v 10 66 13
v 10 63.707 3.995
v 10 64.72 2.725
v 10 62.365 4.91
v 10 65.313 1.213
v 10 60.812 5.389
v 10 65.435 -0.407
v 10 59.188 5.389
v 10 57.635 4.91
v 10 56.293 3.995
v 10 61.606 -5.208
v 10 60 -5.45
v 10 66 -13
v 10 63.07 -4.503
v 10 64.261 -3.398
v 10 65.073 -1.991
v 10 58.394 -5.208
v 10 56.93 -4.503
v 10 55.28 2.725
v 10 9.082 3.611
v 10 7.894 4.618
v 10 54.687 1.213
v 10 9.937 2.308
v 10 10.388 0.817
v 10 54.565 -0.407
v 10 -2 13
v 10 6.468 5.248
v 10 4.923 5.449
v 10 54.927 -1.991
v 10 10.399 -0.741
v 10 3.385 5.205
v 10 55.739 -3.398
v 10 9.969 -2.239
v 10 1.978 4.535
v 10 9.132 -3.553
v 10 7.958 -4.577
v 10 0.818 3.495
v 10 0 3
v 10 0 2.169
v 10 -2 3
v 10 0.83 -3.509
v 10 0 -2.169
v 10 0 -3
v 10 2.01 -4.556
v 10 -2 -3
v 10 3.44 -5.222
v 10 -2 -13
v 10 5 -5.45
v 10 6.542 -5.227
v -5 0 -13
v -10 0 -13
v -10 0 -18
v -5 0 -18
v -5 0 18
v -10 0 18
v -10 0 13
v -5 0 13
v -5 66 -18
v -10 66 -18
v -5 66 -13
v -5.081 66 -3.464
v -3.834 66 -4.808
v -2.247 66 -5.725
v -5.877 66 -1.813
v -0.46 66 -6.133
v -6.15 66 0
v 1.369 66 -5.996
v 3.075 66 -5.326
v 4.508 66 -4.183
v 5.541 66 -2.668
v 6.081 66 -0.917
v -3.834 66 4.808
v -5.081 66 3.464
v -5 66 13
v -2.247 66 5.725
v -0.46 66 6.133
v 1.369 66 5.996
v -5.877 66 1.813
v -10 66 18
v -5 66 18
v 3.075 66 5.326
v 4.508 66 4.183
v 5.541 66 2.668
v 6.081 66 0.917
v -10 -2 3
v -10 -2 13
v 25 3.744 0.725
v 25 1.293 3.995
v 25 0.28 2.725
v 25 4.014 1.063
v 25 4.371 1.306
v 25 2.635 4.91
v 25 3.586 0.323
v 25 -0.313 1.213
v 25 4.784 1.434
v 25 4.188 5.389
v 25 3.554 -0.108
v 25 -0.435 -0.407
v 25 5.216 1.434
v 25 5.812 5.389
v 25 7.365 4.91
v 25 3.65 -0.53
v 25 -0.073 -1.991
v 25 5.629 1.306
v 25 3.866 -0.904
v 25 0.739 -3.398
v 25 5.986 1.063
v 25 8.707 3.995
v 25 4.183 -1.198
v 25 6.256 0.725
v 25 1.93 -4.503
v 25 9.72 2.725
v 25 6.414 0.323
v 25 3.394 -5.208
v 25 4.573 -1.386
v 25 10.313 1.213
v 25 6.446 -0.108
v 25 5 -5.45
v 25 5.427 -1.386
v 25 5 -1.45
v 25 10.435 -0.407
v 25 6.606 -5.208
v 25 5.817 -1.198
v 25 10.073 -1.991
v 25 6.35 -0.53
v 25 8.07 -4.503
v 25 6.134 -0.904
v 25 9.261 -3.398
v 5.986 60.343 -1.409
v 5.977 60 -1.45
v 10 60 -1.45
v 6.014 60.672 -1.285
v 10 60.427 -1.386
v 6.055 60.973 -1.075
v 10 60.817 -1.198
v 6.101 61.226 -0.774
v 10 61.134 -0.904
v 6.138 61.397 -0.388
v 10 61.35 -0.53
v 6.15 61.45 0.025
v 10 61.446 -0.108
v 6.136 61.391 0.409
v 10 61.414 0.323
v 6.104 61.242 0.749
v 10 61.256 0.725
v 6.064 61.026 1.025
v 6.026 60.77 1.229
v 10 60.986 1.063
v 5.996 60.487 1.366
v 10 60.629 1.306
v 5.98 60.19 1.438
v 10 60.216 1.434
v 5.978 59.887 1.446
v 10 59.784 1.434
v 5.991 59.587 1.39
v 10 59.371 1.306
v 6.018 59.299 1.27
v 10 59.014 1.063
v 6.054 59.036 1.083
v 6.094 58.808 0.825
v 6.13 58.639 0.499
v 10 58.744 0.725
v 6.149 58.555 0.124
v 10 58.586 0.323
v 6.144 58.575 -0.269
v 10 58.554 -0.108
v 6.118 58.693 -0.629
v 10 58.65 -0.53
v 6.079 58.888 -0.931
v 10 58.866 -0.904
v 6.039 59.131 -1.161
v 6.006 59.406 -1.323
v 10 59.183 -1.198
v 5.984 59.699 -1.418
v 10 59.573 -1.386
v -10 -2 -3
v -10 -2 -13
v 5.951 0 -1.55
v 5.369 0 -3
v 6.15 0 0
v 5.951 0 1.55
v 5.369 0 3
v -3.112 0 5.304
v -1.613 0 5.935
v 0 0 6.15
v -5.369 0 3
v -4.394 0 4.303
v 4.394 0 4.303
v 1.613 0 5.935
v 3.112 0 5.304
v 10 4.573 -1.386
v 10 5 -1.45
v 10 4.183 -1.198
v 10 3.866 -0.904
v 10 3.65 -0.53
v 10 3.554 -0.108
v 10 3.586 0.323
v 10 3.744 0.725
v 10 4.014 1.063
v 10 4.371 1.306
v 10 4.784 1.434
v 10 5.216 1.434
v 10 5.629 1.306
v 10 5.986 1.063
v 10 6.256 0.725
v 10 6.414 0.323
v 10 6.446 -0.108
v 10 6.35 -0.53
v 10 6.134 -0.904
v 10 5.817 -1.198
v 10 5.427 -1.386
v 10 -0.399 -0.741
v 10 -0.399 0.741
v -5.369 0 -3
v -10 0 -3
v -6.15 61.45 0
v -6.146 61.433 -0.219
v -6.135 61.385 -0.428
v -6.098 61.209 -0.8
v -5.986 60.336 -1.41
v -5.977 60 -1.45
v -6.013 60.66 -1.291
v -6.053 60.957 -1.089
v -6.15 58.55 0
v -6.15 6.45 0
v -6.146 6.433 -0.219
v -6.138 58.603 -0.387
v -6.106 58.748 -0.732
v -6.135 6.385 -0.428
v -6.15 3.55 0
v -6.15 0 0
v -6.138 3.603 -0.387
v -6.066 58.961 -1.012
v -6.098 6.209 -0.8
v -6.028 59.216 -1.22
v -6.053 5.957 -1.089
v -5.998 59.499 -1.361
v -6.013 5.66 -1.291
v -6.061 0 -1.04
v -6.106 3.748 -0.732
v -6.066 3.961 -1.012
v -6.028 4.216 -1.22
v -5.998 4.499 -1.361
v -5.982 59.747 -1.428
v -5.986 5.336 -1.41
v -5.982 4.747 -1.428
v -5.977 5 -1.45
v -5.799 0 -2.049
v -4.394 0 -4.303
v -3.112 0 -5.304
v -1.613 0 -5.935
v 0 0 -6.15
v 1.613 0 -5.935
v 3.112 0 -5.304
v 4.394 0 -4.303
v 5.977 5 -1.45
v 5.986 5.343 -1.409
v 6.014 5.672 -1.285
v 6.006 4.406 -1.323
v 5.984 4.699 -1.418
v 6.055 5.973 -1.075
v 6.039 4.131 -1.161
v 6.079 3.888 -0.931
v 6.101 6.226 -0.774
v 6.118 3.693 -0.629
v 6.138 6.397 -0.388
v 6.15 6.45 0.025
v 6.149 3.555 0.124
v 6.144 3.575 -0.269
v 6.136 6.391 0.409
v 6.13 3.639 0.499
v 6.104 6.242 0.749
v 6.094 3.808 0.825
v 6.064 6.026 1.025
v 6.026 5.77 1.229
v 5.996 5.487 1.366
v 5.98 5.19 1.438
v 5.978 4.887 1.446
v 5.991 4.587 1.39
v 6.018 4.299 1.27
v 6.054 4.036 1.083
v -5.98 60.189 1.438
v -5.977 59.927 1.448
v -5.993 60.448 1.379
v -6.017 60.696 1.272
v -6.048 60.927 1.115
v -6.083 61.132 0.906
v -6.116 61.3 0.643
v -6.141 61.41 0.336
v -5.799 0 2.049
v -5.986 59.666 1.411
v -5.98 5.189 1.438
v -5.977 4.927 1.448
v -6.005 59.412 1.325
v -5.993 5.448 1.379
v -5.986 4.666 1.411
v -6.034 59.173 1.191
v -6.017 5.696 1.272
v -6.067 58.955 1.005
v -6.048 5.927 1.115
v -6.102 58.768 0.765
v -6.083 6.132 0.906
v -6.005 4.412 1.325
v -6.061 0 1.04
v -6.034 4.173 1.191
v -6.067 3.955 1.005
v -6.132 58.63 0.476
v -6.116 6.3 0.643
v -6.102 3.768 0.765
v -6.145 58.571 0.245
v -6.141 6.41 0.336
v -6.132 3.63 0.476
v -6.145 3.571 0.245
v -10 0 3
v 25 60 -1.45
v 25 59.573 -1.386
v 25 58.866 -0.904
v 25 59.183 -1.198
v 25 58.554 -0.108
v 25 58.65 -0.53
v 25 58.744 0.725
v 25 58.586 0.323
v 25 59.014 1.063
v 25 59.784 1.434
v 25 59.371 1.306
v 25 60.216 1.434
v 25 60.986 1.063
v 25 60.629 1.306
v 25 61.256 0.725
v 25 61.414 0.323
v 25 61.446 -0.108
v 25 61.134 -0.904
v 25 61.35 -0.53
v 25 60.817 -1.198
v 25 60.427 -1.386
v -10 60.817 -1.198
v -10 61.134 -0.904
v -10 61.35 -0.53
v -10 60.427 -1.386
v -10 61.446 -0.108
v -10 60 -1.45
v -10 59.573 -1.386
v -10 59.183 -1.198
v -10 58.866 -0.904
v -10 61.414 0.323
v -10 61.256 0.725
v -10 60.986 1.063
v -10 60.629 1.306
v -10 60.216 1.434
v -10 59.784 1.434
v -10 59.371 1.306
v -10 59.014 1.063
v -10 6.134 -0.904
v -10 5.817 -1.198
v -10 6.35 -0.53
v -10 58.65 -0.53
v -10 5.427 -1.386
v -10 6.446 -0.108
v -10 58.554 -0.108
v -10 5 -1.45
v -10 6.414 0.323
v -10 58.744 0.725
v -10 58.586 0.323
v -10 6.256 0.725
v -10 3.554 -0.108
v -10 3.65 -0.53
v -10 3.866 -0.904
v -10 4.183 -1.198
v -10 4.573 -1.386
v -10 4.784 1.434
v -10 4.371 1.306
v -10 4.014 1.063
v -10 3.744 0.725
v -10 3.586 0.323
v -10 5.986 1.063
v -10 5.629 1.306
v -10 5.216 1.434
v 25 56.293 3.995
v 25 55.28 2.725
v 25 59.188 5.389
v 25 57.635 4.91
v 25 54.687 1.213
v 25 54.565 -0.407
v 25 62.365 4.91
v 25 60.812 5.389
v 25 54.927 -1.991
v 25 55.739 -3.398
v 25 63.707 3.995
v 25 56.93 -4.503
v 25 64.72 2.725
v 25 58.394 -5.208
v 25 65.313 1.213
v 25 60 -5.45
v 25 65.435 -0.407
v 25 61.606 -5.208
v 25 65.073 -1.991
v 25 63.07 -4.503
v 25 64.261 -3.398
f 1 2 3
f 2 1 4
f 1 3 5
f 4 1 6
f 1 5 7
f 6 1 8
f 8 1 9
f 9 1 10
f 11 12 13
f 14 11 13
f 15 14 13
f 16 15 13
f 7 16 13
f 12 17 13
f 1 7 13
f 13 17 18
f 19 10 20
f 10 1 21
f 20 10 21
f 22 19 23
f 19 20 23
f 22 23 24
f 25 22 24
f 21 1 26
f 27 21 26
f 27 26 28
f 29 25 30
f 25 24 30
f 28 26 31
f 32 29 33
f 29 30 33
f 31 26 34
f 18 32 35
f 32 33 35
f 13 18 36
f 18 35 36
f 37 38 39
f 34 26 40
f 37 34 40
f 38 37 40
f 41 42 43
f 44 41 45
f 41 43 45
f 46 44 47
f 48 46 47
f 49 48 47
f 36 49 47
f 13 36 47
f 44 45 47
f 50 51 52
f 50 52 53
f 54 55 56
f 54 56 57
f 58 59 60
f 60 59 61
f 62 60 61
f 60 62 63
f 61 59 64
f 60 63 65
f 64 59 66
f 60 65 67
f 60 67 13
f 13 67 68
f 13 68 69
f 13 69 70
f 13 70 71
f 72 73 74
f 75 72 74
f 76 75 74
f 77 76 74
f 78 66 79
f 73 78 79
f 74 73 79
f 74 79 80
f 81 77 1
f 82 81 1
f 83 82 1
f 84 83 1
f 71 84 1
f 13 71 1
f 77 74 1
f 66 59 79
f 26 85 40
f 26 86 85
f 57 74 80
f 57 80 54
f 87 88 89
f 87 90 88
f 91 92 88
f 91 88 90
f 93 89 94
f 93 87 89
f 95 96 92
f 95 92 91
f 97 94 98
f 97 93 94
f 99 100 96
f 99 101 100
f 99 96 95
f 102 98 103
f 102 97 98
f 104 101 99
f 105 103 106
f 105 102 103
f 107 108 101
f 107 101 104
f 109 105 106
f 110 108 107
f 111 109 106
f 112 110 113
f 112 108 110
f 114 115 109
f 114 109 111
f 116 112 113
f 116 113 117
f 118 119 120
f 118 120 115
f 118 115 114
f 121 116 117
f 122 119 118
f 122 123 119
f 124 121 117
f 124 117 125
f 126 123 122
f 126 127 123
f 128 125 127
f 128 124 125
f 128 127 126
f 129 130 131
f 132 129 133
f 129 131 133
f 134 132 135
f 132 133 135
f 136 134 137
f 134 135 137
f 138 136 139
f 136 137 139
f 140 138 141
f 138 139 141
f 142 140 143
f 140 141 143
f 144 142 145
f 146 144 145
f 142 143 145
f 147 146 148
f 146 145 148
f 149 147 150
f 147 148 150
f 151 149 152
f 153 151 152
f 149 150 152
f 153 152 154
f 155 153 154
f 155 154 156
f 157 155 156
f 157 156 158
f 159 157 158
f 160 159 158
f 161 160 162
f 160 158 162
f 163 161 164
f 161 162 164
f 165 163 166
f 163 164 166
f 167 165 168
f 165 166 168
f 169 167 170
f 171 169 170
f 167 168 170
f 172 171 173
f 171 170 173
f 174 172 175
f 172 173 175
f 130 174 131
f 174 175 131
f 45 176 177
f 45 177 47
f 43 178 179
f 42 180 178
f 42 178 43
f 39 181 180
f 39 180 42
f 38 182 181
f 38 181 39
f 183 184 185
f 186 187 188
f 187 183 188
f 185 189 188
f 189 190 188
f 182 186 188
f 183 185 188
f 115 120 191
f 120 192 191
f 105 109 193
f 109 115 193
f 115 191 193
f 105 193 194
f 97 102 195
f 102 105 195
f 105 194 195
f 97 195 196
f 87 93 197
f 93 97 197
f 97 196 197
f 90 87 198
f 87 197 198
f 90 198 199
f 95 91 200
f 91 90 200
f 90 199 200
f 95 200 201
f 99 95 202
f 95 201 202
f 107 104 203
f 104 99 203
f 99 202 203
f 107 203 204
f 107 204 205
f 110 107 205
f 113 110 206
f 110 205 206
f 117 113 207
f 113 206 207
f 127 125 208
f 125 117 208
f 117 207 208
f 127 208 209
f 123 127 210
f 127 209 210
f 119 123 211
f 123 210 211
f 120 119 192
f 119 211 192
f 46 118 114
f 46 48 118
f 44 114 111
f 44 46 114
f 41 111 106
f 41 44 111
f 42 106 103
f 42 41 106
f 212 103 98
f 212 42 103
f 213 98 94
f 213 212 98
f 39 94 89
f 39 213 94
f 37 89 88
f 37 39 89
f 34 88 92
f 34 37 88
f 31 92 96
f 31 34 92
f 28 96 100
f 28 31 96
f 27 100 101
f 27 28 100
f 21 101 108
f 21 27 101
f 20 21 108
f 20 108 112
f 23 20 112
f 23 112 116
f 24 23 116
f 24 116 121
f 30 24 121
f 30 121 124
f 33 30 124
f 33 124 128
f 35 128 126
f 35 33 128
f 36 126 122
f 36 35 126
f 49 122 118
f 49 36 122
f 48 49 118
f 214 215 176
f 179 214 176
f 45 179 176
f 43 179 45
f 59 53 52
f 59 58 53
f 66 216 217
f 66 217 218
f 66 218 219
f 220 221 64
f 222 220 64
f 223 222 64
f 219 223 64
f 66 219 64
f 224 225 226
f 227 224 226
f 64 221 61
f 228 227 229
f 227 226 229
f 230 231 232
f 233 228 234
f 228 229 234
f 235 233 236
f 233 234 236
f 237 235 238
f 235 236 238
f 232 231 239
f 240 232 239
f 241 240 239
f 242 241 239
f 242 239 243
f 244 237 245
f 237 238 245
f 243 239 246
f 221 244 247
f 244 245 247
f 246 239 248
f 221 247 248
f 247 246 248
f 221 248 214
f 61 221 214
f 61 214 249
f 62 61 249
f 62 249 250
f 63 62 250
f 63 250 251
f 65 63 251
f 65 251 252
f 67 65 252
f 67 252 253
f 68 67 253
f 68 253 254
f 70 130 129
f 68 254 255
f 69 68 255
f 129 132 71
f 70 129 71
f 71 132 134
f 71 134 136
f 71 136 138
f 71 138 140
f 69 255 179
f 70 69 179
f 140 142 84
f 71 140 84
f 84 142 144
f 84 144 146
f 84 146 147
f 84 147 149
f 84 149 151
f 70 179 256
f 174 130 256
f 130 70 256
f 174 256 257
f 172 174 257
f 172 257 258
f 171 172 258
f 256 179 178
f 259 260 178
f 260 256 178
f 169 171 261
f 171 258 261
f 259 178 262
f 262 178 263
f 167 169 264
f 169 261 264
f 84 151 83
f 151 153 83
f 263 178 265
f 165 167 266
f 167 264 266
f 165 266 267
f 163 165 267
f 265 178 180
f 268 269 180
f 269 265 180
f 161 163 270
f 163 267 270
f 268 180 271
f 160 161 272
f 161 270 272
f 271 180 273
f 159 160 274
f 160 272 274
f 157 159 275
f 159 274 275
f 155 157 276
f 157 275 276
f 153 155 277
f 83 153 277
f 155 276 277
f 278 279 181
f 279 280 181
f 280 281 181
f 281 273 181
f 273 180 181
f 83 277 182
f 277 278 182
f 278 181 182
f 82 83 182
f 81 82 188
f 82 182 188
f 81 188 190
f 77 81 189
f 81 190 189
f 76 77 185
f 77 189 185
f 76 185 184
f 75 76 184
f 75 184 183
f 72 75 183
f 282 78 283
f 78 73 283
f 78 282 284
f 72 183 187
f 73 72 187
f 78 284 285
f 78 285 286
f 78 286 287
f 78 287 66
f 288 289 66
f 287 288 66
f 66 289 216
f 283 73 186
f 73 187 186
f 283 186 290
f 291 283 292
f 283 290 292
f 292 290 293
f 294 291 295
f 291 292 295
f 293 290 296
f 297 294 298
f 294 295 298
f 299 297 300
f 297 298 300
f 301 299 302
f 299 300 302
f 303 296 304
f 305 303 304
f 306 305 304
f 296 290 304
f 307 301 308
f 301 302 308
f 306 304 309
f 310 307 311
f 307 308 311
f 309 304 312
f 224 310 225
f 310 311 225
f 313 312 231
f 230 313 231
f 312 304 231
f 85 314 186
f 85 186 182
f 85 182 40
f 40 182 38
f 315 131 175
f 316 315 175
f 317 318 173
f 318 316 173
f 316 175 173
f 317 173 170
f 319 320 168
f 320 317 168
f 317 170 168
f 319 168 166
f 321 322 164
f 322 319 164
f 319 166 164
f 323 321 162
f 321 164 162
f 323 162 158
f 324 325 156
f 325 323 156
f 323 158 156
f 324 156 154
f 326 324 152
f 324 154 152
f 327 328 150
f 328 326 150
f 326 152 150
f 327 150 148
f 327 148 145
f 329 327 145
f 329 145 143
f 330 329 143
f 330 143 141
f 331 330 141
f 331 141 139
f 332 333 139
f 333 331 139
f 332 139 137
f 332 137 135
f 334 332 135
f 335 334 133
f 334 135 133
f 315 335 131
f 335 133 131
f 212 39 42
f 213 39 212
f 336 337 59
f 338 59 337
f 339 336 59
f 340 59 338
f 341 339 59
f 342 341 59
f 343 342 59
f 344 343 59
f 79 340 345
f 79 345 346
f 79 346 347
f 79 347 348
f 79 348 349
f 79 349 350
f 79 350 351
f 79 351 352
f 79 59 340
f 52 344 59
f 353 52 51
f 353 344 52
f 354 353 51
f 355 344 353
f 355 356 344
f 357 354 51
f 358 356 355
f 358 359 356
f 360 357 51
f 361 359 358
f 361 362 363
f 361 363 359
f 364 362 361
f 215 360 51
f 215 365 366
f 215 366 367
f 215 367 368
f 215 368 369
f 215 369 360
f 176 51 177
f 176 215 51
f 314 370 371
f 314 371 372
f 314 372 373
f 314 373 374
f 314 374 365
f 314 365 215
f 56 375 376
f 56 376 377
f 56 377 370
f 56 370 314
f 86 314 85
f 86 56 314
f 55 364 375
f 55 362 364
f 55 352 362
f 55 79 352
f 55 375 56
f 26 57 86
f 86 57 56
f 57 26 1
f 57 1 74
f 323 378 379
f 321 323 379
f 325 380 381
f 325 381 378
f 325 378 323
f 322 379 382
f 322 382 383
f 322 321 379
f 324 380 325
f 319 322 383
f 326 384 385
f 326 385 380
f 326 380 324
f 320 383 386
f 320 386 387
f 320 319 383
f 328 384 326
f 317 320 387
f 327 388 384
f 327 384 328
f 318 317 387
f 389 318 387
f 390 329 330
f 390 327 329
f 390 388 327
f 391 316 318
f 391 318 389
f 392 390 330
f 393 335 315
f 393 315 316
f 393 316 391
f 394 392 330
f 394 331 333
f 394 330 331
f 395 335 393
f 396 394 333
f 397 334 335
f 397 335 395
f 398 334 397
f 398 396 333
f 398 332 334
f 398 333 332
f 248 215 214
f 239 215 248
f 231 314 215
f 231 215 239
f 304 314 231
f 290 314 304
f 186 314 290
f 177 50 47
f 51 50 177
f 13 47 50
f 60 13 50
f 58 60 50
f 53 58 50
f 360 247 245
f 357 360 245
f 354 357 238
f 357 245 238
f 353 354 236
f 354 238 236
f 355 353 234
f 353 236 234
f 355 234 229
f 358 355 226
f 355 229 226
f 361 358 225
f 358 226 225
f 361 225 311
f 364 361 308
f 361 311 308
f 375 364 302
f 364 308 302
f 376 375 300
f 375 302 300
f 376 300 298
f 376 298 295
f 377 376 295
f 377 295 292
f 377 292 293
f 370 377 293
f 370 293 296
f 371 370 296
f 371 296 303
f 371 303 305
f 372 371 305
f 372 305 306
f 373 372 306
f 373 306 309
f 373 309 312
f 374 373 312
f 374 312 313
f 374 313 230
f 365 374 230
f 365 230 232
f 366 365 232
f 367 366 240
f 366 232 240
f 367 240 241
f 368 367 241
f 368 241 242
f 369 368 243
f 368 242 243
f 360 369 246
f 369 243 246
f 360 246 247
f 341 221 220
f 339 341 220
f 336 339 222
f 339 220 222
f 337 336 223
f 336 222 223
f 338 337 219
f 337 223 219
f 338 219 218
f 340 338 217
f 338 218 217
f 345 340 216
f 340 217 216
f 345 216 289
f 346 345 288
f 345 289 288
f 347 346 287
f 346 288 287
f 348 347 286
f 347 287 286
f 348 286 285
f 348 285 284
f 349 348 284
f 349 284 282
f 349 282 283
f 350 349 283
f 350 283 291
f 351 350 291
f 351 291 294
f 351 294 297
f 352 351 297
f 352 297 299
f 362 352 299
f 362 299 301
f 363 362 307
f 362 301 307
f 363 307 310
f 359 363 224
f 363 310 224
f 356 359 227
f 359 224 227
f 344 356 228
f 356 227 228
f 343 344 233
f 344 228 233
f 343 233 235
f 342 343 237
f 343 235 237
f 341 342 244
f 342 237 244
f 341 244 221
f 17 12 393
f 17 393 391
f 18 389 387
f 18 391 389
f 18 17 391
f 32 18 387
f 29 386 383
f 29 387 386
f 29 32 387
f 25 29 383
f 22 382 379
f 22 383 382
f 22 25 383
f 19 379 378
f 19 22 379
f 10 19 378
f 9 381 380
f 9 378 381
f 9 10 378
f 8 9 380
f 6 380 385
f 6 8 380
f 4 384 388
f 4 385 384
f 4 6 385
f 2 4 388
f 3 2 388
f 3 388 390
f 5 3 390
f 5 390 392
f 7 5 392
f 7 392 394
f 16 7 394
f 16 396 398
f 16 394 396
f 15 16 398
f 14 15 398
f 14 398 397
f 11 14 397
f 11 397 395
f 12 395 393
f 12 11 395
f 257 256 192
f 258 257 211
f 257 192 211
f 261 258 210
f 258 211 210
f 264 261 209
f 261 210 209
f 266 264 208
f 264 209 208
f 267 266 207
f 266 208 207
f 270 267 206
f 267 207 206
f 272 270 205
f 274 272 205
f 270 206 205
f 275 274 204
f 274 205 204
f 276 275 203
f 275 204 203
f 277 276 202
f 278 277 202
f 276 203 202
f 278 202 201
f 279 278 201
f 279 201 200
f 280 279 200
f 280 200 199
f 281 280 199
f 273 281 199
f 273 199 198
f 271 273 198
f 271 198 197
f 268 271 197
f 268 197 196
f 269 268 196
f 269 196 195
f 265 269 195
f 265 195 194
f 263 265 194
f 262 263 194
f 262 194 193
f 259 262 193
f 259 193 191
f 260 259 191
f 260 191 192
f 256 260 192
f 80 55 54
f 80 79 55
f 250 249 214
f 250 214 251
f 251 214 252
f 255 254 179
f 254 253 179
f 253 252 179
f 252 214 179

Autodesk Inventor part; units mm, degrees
ref_plane "YZ Plane" through (0, 0, 0) normal (1, 0, 0) x (0, 1, 0)
ref_plane "XZ Plane" through (0, 0, 0) normal (0, 1, 0) x (-1, 0, 0)
ref_plane "XY Plane" through (0, 0, 0) normal (0, 0, 1) x (1, 0, 0)
sketch "Sketch1" plane through (0, 0, 0) normal (0, 1, 0) x (-1, 0, 0)
  circle A0 centre (0, 0) radius 6.15
  line L0 (10, 13) -> (-10, 13)
  line L1 (-10, 13) -> (-10, -13)
  line L2 (-10, -13) -> (10, -13)
  line L3 (10, -13) -> (10, 13)
  dimension "d0" = 12.3
  dimension "d1" = 10
  dimension "d2" = 10
  dimension "d3" = 13
  dimension "d4" = 13
extrude "Extrusion1" add sketch "Sketch1" along normal blind 66
sketch "Sketch2" plane through (10, 0, 13) normal (1, 0, 0) x (0, 0, -1)
  circle A0 centre (13, 5) radius 1.45
  line L0 (0, 0) -> (26, 0) projected
  circle A1 centre (13, 60) radius 1.45
  line L1 (0, 0) -> (0, 66) projected
  point P0 (13, 0)
  dimension "d7" = 2.9
  dimension "d8" = 5
  dimension "d9" = 2.9
  dimension "d11" = 13
  dimension "d12" = 13
  dimension "d41" = 55
extrude "Extrusion2" cut sketch "Sketch2" against normal blind 55
sketch "Sketch3" plane through (10, 0, 13) normal (1, 0, 0) x (0, 0, -1)
  circle A0 centre (13, 5) radius 1.45 projected
  circle A1 centre (13, 60) radius 1.45 projected
  line L0 (0, 0) -> (26, 0) projected
  line L1 (26, 0) -> (26, 66) projected
  line L2 (0, 66) -> (26, 66) projected
  line L3 (0, 0) -> (0, 66) projected
  circle A2 centre (13, 60) radius 5.45
  circle A3 centre (13, 5) radius 5.45
  circle A4 centre (4, 46) radius 1.6
  circle A5 centre (22, 46) radius 1.6
  circle A6 centre (4, 4) radius 1.6
  circle A7 centre (22, 4) radius 1.6
  point P0 (13, 0)
  dimension "d15" = 4
  dimension "d16" = 4
  dimension "d19" = 3.2
  dimension "d20" = 3.2
  dimension "d21" = 3.2
  dimension "d22" = 3.2
  dimension "d23" = 4
  dimension "d24" = 4
  dimension "d25" = 4
  dimension "d26" = 4
extrude "Extrusion3" add sketch "Sketch3" along normal blind 15 contours A3 L0 | L0 A3 | A2
sketch "Sketch6" plane through (-10, 0, 13) normal (0, 0, 1) x (1, 0, 0)
  line L0 (20, 66) -> (0, 66) projected
  line L1 (20, 0) -> (0, 0) projected
  line L2 (0, 66) -> (5, 66)
  line L3 (5, 66) -> (5, 0)
  line L4 (5, 0) -> (0, 0)
  line L5 (0, 0) -> (0, 66)
  point P0 (10, 0)
  dimension "d31" = 5
extrude "Extrusion6" add sketch "Sketch6" along normal blind 5
sketch "Sketch7" plane through (10, 0, -13) normal (0, 0, -1) x (-1, 0, 0)
  line L0 (20, 66) -> (20, 0) projected
  line L1 (20, 0) -> (15, 0) projected
  line L2 (20, 66) -> (15, 66)
  line L3 (15, 66) -> (15, 0)
  line L4 (15, 0) -> (20, 0)
  line L5 (20, 0) -> (20, 66)
  point P0 (10, 0)
  dimension "d34" = 5
extrude "Extrusion7" add sketch "Sketch7" along normal blind 5
sketch "Sketch8" plane through (0, 0, 0) normal (0, -1, 0) x (1, 0, 0)
  line L0 (10, 13) -> (10, -13) projected
  line L1 (-10, 18) -> (-10, -18) projected
  line L2 (10, 13) -> (-10, 13)
  line L3 (-10, 13) -> (-10, 3)
  line L4 (-10, 3) -> (10, 3)
  line L5 (10, 3) -> (10, 13)
  line L6 (10, -13) -> (-5, -13) projected
  line L7 (10, -13) -> (-10, -13)
  line L8 (-10, -13) -> (-10, -3)
  line L9 (-10, -3) -> (10, -3)
  line L10 (10, -3) -> (10, -13)
  point P0 (0, 0)
  point P1 (10, -3)
  point P2 (-10, -3)
  dimension "d37" = 10
  dimension "d38" = 10
extrude "Extrusion8" add sketch "Sketch8" along normal blind 2 contours L0 L4 L1 L2 | L0 L6 L7 L1 L9
properties part number "Tube_outerhole_template_large_p1"
